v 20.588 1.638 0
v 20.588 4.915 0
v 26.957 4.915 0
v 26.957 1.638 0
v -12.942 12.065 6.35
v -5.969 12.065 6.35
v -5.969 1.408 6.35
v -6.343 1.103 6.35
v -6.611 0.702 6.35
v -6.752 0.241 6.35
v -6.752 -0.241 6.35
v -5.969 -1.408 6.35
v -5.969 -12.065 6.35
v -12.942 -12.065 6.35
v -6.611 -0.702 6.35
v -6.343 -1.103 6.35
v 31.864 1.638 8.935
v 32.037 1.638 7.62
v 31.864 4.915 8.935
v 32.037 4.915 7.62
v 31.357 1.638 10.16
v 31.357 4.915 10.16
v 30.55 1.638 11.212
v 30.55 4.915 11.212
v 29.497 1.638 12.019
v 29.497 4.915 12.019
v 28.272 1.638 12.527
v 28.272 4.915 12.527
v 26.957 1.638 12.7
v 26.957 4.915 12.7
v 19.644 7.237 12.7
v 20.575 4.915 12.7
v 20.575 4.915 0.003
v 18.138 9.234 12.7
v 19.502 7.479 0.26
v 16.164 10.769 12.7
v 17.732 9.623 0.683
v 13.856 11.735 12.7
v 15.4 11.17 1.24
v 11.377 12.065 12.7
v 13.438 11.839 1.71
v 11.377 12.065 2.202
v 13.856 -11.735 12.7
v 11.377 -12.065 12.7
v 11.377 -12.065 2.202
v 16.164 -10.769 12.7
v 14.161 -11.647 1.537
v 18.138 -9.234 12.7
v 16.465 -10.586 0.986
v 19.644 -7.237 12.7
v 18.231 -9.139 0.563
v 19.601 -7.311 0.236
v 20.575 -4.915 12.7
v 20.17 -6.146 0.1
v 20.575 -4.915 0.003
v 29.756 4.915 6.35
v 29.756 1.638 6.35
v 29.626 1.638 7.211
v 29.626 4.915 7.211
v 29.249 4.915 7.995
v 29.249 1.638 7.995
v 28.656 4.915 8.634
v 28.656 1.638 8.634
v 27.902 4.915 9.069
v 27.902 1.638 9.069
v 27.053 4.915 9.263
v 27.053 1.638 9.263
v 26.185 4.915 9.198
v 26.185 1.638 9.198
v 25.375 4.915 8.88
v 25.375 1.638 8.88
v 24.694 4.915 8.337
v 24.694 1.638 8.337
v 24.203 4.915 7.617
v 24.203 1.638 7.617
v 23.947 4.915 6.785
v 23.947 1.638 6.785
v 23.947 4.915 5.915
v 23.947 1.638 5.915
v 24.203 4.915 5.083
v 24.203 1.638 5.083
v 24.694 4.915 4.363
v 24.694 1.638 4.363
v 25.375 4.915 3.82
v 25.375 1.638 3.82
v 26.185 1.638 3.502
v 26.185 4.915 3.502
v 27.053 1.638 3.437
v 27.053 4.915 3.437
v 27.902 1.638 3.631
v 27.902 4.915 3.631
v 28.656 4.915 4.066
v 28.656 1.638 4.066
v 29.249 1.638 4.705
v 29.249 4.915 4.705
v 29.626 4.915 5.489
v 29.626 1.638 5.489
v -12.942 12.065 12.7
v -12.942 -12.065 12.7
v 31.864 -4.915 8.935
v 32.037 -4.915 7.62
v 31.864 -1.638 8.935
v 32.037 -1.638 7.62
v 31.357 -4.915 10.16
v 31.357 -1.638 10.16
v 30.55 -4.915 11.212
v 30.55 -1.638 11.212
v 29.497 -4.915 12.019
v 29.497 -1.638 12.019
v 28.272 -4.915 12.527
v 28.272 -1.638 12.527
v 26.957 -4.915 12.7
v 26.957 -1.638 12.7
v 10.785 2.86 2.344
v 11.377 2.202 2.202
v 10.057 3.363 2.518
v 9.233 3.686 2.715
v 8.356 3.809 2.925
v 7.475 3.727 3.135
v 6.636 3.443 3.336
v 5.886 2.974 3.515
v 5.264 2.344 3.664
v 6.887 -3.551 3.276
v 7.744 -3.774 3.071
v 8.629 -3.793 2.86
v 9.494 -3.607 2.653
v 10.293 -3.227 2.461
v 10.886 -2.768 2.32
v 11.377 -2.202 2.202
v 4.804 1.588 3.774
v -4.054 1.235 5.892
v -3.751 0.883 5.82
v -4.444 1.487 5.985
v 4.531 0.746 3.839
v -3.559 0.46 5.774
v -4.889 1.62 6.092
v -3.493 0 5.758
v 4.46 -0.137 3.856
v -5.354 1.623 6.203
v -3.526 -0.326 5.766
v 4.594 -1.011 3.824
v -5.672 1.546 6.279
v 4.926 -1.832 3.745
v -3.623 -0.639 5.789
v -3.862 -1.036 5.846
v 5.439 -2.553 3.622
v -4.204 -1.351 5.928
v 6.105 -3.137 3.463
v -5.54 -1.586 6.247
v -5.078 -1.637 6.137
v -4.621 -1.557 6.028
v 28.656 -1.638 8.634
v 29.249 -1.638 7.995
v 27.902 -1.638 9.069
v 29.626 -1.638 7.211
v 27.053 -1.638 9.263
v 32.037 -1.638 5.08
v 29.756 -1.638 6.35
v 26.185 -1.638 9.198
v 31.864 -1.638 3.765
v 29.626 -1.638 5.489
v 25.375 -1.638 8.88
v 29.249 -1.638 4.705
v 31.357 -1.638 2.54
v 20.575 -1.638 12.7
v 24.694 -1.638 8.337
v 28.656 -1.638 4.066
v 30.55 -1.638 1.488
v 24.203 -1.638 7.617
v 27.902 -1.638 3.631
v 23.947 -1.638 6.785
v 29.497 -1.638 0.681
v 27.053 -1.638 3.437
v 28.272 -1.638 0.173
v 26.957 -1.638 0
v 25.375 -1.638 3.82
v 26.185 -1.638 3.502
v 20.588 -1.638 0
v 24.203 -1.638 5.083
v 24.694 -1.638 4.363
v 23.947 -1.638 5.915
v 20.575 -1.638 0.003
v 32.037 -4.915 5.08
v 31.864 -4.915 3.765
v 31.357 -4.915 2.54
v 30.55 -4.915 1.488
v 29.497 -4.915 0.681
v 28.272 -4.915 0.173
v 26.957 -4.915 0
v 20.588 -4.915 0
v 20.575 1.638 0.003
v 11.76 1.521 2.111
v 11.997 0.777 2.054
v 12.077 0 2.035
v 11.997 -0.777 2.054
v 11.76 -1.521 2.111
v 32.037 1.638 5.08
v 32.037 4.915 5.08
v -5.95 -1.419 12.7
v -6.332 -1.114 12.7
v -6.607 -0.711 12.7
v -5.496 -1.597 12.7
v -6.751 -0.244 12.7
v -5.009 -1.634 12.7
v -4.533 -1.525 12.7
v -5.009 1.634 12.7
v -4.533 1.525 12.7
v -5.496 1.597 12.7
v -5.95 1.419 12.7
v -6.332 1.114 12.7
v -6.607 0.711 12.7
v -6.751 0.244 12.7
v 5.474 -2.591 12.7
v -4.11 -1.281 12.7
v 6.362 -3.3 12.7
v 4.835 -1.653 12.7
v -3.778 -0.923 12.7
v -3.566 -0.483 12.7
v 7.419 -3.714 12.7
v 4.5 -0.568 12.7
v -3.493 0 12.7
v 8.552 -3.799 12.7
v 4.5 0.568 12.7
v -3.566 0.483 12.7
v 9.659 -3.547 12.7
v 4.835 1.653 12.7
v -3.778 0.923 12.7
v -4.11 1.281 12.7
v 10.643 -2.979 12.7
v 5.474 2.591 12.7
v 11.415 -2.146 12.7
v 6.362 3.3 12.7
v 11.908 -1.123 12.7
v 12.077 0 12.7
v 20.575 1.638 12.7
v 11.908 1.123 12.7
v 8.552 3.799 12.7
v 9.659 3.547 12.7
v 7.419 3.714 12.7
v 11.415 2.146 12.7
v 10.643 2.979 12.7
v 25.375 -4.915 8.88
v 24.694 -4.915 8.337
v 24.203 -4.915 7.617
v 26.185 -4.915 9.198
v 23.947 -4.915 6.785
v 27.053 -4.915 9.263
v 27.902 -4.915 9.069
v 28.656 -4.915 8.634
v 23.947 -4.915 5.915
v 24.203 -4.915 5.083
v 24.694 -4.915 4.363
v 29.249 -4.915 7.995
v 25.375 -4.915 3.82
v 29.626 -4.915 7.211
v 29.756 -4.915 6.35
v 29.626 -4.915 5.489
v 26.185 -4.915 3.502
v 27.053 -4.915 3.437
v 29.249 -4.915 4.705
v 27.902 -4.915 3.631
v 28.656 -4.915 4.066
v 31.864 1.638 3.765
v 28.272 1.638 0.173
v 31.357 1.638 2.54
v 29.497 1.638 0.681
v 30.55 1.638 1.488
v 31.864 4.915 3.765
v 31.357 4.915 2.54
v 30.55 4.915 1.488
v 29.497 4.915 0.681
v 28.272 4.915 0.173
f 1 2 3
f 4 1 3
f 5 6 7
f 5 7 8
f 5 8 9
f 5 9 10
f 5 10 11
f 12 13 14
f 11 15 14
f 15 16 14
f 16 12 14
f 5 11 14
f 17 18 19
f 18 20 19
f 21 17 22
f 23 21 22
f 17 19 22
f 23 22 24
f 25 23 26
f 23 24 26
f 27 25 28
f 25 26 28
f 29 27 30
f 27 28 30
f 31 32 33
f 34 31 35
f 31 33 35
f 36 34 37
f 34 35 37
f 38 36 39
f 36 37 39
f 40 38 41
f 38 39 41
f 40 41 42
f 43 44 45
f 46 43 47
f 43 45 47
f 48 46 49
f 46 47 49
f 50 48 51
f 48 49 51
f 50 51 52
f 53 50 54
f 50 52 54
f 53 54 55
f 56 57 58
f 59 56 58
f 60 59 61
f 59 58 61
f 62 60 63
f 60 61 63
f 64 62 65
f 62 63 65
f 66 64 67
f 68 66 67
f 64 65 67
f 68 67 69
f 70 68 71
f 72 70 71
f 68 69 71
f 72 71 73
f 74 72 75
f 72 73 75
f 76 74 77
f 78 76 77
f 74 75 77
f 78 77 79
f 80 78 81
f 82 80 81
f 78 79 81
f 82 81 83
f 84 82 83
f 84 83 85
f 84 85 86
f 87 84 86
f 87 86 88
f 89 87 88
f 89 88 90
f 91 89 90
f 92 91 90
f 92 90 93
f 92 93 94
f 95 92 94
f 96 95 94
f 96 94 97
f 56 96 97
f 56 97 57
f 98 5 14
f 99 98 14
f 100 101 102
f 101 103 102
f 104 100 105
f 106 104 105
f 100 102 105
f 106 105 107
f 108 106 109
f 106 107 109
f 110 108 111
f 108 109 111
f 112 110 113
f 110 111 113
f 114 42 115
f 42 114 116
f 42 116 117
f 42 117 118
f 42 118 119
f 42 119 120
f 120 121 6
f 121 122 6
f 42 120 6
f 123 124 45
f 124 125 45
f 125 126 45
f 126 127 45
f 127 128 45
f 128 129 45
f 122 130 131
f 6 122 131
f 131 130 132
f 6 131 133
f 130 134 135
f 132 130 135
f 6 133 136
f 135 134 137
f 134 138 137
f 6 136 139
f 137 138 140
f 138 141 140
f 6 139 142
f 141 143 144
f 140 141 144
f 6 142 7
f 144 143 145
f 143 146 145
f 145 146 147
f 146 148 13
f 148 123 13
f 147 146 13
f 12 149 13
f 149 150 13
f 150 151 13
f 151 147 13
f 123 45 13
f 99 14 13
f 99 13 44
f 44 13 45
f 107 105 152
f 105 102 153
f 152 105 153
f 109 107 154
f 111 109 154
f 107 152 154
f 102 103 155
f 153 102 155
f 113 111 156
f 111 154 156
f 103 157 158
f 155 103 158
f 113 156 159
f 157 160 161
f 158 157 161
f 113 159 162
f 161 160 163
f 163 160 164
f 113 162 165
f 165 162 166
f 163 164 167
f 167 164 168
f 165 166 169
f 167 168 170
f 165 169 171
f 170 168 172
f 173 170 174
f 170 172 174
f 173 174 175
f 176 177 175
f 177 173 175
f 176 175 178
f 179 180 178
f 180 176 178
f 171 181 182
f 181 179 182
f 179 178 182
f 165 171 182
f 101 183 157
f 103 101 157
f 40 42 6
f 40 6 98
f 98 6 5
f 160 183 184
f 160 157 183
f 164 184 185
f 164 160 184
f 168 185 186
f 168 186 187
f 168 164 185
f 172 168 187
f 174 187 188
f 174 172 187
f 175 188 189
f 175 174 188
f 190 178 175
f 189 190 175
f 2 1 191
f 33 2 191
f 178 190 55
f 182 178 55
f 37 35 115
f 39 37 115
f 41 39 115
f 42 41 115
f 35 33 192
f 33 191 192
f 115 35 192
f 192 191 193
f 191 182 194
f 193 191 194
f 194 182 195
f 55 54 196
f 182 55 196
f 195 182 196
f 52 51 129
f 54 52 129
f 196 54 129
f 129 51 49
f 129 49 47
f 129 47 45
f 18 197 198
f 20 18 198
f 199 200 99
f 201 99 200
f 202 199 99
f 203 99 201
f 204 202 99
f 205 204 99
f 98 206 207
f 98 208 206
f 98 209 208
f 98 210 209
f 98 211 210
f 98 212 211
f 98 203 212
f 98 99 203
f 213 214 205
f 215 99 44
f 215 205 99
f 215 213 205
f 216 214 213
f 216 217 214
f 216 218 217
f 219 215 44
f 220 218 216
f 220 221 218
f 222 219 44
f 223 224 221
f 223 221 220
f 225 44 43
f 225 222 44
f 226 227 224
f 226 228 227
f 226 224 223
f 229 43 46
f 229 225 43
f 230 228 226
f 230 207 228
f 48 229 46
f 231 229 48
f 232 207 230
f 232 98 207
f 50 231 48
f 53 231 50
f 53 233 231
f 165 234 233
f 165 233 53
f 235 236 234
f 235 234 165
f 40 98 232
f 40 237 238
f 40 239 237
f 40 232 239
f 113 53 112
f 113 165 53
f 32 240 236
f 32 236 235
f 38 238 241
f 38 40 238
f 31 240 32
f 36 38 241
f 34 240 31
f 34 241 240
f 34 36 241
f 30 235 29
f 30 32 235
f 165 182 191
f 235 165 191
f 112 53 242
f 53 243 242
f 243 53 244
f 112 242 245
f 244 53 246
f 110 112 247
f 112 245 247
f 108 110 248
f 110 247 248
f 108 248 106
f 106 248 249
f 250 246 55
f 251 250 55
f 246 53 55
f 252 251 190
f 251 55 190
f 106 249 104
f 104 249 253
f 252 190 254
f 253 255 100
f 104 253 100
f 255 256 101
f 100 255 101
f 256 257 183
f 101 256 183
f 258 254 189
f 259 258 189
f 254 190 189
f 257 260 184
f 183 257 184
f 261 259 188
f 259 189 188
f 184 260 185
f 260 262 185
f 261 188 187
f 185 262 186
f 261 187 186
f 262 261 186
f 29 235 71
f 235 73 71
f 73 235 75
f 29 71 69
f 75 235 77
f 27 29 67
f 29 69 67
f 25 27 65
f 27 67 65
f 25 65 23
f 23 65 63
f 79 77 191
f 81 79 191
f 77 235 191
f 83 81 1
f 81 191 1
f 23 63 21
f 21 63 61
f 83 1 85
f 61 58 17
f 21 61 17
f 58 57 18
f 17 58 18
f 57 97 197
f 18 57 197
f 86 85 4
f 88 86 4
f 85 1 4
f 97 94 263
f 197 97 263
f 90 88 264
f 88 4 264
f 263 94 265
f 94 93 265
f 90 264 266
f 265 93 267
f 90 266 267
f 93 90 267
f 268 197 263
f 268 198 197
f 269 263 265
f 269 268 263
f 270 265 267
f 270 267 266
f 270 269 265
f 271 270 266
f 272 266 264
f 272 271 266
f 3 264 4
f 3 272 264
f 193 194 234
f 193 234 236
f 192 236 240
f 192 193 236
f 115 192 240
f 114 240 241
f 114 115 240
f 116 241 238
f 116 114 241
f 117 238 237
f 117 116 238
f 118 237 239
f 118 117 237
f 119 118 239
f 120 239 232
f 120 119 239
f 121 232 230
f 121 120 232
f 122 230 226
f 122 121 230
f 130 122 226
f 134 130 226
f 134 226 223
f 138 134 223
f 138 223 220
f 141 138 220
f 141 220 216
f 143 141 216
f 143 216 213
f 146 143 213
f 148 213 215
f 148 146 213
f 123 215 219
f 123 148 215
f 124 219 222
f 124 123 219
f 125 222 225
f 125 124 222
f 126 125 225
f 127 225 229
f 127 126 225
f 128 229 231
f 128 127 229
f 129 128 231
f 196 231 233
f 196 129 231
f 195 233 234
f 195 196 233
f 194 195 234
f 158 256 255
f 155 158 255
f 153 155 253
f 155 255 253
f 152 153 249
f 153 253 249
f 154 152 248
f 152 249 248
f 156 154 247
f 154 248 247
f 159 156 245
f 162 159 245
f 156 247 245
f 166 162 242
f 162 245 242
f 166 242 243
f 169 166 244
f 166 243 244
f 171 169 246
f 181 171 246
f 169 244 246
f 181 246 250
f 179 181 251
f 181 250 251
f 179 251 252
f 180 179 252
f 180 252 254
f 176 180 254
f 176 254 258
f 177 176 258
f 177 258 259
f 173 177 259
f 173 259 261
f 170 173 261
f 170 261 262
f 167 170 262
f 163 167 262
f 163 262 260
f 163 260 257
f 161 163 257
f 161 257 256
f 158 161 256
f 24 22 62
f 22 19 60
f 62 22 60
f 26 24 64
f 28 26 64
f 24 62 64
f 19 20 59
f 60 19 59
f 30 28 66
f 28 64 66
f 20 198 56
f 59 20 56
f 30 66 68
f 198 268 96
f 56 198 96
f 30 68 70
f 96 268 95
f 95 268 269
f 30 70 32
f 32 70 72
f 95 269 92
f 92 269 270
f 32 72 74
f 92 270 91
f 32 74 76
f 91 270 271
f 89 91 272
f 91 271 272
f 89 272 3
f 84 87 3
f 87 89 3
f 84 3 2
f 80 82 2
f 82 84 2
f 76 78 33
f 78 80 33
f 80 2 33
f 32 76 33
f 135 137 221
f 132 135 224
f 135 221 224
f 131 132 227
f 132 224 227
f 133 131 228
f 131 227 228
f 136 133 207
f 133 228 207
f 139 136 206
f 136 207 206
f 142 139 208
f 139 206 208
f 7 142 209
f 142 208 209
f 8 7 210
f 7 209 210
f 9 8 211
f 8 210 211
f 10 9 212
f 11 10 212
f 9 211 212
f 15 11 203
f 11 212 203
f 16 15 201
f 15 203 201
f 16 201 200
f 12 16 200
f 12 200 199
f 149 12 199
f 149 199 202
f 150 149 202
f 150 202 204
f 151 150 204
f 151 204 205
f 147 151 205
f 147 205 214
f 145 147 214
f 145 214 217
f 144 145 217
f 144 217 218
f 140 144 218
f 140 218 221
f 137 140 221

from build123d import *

# Parameters (mm, degrees)
F0_R     = 3.81
F1_DEPTH = 12.7
F3_R     = 5.08
F2_R     = 2.921
F4_DEPTH = 16.9809
F6_DEPTH = 24.131
F7_R     = 1.6383
F8_DEPTH = 25.4


with BuildPart() as f1:
    # F0 (on Top) → F1 (new body)
    with BuildSketch(Plane.XY):
        with BuildLine():
            Line((11.376741, 12.065), (-12.94174, 12.065))
            Line((-12.94174, 12.065), (-12.94174, -12.065))
            Line((-12.94174, -12.065), (11.376741, -12.065))
            ThreePointArc((11.376741, -12.065), (17.201771, -10.067217), (20.574564, -4.9149))
            Line((20.574564, -4.9149), (32.037482, -4.9149))
            Line((32.037482, -4.9149), (32.037482, -1.6383))
            Line((32.037482, -1.6383), (20.574564, -1.6383))
            Line((20.574564, -1.6383), (20.574564, 1.6383))
            Line((20.574564, 1.6383), (32.037482, 1.6383))
            Line((32.037482, 1.6383), (32.037482, 4.9149))
            Line((32.037482, 4.9149), (20.574564, 4.9149))
            ThreePointArc((20.574564, 4.9149), (17.201771, 10.067217), (11.376741, 12.065))
        make_face()
        with Locations((8.26726, 0)):
            Circle(F0_R, mode=Mode.SUBTRACT)
    extrude(amount=F1_DEPTH)

    # F3
    f3_edges = [f1.edges().sort_by_distance(p)[0] for p in [
        (32.037482, -3.2766, 12.7),
        (32.037482, 3.2766, 12.7),
        (32.037482, -3.2766, 0),
        (32.037482, 3.2766, 0),
    ]]
    fillet(f3_edges, radius=F3_R)

    # F2 (on face) → F4 (cut, through all)
    with BuildSketch(Plane.XZ.offset(4.9149)):
        with Locations((26.8351, 6.35)):
            Circle(F2_R)
    extrude(amount=-F4_DEPTH, mode=Mode.SUBTRACT)

    # F5 (on face) → F6 (cut, through all)
    with BuildSketch(Plane.XZ.offset(12.065)):
        Polygon((-5.969032, 6.35), (-12.94174, 6.35), (-12.94174, 0), (11.376741, 0), (11.376741, 2.202417), align=None)
        Polygon((20.58756, 0), (11.376741, 2.202417), (11.376741, 0), align=None)
    extrude(amount=-F6_DEPTH, mode=Mode.SUBTRACT)

    # F7 (on face) → F8 (cut)
    with BuildSketch(Plane.XY.offset(12.7)):
        with Locations((-5.13124, 0)):
            Circle(F7_R)
    extrude(amount=-F8_DEPTH, mode=Mode.SUBTRACT)


solid = f1.part
